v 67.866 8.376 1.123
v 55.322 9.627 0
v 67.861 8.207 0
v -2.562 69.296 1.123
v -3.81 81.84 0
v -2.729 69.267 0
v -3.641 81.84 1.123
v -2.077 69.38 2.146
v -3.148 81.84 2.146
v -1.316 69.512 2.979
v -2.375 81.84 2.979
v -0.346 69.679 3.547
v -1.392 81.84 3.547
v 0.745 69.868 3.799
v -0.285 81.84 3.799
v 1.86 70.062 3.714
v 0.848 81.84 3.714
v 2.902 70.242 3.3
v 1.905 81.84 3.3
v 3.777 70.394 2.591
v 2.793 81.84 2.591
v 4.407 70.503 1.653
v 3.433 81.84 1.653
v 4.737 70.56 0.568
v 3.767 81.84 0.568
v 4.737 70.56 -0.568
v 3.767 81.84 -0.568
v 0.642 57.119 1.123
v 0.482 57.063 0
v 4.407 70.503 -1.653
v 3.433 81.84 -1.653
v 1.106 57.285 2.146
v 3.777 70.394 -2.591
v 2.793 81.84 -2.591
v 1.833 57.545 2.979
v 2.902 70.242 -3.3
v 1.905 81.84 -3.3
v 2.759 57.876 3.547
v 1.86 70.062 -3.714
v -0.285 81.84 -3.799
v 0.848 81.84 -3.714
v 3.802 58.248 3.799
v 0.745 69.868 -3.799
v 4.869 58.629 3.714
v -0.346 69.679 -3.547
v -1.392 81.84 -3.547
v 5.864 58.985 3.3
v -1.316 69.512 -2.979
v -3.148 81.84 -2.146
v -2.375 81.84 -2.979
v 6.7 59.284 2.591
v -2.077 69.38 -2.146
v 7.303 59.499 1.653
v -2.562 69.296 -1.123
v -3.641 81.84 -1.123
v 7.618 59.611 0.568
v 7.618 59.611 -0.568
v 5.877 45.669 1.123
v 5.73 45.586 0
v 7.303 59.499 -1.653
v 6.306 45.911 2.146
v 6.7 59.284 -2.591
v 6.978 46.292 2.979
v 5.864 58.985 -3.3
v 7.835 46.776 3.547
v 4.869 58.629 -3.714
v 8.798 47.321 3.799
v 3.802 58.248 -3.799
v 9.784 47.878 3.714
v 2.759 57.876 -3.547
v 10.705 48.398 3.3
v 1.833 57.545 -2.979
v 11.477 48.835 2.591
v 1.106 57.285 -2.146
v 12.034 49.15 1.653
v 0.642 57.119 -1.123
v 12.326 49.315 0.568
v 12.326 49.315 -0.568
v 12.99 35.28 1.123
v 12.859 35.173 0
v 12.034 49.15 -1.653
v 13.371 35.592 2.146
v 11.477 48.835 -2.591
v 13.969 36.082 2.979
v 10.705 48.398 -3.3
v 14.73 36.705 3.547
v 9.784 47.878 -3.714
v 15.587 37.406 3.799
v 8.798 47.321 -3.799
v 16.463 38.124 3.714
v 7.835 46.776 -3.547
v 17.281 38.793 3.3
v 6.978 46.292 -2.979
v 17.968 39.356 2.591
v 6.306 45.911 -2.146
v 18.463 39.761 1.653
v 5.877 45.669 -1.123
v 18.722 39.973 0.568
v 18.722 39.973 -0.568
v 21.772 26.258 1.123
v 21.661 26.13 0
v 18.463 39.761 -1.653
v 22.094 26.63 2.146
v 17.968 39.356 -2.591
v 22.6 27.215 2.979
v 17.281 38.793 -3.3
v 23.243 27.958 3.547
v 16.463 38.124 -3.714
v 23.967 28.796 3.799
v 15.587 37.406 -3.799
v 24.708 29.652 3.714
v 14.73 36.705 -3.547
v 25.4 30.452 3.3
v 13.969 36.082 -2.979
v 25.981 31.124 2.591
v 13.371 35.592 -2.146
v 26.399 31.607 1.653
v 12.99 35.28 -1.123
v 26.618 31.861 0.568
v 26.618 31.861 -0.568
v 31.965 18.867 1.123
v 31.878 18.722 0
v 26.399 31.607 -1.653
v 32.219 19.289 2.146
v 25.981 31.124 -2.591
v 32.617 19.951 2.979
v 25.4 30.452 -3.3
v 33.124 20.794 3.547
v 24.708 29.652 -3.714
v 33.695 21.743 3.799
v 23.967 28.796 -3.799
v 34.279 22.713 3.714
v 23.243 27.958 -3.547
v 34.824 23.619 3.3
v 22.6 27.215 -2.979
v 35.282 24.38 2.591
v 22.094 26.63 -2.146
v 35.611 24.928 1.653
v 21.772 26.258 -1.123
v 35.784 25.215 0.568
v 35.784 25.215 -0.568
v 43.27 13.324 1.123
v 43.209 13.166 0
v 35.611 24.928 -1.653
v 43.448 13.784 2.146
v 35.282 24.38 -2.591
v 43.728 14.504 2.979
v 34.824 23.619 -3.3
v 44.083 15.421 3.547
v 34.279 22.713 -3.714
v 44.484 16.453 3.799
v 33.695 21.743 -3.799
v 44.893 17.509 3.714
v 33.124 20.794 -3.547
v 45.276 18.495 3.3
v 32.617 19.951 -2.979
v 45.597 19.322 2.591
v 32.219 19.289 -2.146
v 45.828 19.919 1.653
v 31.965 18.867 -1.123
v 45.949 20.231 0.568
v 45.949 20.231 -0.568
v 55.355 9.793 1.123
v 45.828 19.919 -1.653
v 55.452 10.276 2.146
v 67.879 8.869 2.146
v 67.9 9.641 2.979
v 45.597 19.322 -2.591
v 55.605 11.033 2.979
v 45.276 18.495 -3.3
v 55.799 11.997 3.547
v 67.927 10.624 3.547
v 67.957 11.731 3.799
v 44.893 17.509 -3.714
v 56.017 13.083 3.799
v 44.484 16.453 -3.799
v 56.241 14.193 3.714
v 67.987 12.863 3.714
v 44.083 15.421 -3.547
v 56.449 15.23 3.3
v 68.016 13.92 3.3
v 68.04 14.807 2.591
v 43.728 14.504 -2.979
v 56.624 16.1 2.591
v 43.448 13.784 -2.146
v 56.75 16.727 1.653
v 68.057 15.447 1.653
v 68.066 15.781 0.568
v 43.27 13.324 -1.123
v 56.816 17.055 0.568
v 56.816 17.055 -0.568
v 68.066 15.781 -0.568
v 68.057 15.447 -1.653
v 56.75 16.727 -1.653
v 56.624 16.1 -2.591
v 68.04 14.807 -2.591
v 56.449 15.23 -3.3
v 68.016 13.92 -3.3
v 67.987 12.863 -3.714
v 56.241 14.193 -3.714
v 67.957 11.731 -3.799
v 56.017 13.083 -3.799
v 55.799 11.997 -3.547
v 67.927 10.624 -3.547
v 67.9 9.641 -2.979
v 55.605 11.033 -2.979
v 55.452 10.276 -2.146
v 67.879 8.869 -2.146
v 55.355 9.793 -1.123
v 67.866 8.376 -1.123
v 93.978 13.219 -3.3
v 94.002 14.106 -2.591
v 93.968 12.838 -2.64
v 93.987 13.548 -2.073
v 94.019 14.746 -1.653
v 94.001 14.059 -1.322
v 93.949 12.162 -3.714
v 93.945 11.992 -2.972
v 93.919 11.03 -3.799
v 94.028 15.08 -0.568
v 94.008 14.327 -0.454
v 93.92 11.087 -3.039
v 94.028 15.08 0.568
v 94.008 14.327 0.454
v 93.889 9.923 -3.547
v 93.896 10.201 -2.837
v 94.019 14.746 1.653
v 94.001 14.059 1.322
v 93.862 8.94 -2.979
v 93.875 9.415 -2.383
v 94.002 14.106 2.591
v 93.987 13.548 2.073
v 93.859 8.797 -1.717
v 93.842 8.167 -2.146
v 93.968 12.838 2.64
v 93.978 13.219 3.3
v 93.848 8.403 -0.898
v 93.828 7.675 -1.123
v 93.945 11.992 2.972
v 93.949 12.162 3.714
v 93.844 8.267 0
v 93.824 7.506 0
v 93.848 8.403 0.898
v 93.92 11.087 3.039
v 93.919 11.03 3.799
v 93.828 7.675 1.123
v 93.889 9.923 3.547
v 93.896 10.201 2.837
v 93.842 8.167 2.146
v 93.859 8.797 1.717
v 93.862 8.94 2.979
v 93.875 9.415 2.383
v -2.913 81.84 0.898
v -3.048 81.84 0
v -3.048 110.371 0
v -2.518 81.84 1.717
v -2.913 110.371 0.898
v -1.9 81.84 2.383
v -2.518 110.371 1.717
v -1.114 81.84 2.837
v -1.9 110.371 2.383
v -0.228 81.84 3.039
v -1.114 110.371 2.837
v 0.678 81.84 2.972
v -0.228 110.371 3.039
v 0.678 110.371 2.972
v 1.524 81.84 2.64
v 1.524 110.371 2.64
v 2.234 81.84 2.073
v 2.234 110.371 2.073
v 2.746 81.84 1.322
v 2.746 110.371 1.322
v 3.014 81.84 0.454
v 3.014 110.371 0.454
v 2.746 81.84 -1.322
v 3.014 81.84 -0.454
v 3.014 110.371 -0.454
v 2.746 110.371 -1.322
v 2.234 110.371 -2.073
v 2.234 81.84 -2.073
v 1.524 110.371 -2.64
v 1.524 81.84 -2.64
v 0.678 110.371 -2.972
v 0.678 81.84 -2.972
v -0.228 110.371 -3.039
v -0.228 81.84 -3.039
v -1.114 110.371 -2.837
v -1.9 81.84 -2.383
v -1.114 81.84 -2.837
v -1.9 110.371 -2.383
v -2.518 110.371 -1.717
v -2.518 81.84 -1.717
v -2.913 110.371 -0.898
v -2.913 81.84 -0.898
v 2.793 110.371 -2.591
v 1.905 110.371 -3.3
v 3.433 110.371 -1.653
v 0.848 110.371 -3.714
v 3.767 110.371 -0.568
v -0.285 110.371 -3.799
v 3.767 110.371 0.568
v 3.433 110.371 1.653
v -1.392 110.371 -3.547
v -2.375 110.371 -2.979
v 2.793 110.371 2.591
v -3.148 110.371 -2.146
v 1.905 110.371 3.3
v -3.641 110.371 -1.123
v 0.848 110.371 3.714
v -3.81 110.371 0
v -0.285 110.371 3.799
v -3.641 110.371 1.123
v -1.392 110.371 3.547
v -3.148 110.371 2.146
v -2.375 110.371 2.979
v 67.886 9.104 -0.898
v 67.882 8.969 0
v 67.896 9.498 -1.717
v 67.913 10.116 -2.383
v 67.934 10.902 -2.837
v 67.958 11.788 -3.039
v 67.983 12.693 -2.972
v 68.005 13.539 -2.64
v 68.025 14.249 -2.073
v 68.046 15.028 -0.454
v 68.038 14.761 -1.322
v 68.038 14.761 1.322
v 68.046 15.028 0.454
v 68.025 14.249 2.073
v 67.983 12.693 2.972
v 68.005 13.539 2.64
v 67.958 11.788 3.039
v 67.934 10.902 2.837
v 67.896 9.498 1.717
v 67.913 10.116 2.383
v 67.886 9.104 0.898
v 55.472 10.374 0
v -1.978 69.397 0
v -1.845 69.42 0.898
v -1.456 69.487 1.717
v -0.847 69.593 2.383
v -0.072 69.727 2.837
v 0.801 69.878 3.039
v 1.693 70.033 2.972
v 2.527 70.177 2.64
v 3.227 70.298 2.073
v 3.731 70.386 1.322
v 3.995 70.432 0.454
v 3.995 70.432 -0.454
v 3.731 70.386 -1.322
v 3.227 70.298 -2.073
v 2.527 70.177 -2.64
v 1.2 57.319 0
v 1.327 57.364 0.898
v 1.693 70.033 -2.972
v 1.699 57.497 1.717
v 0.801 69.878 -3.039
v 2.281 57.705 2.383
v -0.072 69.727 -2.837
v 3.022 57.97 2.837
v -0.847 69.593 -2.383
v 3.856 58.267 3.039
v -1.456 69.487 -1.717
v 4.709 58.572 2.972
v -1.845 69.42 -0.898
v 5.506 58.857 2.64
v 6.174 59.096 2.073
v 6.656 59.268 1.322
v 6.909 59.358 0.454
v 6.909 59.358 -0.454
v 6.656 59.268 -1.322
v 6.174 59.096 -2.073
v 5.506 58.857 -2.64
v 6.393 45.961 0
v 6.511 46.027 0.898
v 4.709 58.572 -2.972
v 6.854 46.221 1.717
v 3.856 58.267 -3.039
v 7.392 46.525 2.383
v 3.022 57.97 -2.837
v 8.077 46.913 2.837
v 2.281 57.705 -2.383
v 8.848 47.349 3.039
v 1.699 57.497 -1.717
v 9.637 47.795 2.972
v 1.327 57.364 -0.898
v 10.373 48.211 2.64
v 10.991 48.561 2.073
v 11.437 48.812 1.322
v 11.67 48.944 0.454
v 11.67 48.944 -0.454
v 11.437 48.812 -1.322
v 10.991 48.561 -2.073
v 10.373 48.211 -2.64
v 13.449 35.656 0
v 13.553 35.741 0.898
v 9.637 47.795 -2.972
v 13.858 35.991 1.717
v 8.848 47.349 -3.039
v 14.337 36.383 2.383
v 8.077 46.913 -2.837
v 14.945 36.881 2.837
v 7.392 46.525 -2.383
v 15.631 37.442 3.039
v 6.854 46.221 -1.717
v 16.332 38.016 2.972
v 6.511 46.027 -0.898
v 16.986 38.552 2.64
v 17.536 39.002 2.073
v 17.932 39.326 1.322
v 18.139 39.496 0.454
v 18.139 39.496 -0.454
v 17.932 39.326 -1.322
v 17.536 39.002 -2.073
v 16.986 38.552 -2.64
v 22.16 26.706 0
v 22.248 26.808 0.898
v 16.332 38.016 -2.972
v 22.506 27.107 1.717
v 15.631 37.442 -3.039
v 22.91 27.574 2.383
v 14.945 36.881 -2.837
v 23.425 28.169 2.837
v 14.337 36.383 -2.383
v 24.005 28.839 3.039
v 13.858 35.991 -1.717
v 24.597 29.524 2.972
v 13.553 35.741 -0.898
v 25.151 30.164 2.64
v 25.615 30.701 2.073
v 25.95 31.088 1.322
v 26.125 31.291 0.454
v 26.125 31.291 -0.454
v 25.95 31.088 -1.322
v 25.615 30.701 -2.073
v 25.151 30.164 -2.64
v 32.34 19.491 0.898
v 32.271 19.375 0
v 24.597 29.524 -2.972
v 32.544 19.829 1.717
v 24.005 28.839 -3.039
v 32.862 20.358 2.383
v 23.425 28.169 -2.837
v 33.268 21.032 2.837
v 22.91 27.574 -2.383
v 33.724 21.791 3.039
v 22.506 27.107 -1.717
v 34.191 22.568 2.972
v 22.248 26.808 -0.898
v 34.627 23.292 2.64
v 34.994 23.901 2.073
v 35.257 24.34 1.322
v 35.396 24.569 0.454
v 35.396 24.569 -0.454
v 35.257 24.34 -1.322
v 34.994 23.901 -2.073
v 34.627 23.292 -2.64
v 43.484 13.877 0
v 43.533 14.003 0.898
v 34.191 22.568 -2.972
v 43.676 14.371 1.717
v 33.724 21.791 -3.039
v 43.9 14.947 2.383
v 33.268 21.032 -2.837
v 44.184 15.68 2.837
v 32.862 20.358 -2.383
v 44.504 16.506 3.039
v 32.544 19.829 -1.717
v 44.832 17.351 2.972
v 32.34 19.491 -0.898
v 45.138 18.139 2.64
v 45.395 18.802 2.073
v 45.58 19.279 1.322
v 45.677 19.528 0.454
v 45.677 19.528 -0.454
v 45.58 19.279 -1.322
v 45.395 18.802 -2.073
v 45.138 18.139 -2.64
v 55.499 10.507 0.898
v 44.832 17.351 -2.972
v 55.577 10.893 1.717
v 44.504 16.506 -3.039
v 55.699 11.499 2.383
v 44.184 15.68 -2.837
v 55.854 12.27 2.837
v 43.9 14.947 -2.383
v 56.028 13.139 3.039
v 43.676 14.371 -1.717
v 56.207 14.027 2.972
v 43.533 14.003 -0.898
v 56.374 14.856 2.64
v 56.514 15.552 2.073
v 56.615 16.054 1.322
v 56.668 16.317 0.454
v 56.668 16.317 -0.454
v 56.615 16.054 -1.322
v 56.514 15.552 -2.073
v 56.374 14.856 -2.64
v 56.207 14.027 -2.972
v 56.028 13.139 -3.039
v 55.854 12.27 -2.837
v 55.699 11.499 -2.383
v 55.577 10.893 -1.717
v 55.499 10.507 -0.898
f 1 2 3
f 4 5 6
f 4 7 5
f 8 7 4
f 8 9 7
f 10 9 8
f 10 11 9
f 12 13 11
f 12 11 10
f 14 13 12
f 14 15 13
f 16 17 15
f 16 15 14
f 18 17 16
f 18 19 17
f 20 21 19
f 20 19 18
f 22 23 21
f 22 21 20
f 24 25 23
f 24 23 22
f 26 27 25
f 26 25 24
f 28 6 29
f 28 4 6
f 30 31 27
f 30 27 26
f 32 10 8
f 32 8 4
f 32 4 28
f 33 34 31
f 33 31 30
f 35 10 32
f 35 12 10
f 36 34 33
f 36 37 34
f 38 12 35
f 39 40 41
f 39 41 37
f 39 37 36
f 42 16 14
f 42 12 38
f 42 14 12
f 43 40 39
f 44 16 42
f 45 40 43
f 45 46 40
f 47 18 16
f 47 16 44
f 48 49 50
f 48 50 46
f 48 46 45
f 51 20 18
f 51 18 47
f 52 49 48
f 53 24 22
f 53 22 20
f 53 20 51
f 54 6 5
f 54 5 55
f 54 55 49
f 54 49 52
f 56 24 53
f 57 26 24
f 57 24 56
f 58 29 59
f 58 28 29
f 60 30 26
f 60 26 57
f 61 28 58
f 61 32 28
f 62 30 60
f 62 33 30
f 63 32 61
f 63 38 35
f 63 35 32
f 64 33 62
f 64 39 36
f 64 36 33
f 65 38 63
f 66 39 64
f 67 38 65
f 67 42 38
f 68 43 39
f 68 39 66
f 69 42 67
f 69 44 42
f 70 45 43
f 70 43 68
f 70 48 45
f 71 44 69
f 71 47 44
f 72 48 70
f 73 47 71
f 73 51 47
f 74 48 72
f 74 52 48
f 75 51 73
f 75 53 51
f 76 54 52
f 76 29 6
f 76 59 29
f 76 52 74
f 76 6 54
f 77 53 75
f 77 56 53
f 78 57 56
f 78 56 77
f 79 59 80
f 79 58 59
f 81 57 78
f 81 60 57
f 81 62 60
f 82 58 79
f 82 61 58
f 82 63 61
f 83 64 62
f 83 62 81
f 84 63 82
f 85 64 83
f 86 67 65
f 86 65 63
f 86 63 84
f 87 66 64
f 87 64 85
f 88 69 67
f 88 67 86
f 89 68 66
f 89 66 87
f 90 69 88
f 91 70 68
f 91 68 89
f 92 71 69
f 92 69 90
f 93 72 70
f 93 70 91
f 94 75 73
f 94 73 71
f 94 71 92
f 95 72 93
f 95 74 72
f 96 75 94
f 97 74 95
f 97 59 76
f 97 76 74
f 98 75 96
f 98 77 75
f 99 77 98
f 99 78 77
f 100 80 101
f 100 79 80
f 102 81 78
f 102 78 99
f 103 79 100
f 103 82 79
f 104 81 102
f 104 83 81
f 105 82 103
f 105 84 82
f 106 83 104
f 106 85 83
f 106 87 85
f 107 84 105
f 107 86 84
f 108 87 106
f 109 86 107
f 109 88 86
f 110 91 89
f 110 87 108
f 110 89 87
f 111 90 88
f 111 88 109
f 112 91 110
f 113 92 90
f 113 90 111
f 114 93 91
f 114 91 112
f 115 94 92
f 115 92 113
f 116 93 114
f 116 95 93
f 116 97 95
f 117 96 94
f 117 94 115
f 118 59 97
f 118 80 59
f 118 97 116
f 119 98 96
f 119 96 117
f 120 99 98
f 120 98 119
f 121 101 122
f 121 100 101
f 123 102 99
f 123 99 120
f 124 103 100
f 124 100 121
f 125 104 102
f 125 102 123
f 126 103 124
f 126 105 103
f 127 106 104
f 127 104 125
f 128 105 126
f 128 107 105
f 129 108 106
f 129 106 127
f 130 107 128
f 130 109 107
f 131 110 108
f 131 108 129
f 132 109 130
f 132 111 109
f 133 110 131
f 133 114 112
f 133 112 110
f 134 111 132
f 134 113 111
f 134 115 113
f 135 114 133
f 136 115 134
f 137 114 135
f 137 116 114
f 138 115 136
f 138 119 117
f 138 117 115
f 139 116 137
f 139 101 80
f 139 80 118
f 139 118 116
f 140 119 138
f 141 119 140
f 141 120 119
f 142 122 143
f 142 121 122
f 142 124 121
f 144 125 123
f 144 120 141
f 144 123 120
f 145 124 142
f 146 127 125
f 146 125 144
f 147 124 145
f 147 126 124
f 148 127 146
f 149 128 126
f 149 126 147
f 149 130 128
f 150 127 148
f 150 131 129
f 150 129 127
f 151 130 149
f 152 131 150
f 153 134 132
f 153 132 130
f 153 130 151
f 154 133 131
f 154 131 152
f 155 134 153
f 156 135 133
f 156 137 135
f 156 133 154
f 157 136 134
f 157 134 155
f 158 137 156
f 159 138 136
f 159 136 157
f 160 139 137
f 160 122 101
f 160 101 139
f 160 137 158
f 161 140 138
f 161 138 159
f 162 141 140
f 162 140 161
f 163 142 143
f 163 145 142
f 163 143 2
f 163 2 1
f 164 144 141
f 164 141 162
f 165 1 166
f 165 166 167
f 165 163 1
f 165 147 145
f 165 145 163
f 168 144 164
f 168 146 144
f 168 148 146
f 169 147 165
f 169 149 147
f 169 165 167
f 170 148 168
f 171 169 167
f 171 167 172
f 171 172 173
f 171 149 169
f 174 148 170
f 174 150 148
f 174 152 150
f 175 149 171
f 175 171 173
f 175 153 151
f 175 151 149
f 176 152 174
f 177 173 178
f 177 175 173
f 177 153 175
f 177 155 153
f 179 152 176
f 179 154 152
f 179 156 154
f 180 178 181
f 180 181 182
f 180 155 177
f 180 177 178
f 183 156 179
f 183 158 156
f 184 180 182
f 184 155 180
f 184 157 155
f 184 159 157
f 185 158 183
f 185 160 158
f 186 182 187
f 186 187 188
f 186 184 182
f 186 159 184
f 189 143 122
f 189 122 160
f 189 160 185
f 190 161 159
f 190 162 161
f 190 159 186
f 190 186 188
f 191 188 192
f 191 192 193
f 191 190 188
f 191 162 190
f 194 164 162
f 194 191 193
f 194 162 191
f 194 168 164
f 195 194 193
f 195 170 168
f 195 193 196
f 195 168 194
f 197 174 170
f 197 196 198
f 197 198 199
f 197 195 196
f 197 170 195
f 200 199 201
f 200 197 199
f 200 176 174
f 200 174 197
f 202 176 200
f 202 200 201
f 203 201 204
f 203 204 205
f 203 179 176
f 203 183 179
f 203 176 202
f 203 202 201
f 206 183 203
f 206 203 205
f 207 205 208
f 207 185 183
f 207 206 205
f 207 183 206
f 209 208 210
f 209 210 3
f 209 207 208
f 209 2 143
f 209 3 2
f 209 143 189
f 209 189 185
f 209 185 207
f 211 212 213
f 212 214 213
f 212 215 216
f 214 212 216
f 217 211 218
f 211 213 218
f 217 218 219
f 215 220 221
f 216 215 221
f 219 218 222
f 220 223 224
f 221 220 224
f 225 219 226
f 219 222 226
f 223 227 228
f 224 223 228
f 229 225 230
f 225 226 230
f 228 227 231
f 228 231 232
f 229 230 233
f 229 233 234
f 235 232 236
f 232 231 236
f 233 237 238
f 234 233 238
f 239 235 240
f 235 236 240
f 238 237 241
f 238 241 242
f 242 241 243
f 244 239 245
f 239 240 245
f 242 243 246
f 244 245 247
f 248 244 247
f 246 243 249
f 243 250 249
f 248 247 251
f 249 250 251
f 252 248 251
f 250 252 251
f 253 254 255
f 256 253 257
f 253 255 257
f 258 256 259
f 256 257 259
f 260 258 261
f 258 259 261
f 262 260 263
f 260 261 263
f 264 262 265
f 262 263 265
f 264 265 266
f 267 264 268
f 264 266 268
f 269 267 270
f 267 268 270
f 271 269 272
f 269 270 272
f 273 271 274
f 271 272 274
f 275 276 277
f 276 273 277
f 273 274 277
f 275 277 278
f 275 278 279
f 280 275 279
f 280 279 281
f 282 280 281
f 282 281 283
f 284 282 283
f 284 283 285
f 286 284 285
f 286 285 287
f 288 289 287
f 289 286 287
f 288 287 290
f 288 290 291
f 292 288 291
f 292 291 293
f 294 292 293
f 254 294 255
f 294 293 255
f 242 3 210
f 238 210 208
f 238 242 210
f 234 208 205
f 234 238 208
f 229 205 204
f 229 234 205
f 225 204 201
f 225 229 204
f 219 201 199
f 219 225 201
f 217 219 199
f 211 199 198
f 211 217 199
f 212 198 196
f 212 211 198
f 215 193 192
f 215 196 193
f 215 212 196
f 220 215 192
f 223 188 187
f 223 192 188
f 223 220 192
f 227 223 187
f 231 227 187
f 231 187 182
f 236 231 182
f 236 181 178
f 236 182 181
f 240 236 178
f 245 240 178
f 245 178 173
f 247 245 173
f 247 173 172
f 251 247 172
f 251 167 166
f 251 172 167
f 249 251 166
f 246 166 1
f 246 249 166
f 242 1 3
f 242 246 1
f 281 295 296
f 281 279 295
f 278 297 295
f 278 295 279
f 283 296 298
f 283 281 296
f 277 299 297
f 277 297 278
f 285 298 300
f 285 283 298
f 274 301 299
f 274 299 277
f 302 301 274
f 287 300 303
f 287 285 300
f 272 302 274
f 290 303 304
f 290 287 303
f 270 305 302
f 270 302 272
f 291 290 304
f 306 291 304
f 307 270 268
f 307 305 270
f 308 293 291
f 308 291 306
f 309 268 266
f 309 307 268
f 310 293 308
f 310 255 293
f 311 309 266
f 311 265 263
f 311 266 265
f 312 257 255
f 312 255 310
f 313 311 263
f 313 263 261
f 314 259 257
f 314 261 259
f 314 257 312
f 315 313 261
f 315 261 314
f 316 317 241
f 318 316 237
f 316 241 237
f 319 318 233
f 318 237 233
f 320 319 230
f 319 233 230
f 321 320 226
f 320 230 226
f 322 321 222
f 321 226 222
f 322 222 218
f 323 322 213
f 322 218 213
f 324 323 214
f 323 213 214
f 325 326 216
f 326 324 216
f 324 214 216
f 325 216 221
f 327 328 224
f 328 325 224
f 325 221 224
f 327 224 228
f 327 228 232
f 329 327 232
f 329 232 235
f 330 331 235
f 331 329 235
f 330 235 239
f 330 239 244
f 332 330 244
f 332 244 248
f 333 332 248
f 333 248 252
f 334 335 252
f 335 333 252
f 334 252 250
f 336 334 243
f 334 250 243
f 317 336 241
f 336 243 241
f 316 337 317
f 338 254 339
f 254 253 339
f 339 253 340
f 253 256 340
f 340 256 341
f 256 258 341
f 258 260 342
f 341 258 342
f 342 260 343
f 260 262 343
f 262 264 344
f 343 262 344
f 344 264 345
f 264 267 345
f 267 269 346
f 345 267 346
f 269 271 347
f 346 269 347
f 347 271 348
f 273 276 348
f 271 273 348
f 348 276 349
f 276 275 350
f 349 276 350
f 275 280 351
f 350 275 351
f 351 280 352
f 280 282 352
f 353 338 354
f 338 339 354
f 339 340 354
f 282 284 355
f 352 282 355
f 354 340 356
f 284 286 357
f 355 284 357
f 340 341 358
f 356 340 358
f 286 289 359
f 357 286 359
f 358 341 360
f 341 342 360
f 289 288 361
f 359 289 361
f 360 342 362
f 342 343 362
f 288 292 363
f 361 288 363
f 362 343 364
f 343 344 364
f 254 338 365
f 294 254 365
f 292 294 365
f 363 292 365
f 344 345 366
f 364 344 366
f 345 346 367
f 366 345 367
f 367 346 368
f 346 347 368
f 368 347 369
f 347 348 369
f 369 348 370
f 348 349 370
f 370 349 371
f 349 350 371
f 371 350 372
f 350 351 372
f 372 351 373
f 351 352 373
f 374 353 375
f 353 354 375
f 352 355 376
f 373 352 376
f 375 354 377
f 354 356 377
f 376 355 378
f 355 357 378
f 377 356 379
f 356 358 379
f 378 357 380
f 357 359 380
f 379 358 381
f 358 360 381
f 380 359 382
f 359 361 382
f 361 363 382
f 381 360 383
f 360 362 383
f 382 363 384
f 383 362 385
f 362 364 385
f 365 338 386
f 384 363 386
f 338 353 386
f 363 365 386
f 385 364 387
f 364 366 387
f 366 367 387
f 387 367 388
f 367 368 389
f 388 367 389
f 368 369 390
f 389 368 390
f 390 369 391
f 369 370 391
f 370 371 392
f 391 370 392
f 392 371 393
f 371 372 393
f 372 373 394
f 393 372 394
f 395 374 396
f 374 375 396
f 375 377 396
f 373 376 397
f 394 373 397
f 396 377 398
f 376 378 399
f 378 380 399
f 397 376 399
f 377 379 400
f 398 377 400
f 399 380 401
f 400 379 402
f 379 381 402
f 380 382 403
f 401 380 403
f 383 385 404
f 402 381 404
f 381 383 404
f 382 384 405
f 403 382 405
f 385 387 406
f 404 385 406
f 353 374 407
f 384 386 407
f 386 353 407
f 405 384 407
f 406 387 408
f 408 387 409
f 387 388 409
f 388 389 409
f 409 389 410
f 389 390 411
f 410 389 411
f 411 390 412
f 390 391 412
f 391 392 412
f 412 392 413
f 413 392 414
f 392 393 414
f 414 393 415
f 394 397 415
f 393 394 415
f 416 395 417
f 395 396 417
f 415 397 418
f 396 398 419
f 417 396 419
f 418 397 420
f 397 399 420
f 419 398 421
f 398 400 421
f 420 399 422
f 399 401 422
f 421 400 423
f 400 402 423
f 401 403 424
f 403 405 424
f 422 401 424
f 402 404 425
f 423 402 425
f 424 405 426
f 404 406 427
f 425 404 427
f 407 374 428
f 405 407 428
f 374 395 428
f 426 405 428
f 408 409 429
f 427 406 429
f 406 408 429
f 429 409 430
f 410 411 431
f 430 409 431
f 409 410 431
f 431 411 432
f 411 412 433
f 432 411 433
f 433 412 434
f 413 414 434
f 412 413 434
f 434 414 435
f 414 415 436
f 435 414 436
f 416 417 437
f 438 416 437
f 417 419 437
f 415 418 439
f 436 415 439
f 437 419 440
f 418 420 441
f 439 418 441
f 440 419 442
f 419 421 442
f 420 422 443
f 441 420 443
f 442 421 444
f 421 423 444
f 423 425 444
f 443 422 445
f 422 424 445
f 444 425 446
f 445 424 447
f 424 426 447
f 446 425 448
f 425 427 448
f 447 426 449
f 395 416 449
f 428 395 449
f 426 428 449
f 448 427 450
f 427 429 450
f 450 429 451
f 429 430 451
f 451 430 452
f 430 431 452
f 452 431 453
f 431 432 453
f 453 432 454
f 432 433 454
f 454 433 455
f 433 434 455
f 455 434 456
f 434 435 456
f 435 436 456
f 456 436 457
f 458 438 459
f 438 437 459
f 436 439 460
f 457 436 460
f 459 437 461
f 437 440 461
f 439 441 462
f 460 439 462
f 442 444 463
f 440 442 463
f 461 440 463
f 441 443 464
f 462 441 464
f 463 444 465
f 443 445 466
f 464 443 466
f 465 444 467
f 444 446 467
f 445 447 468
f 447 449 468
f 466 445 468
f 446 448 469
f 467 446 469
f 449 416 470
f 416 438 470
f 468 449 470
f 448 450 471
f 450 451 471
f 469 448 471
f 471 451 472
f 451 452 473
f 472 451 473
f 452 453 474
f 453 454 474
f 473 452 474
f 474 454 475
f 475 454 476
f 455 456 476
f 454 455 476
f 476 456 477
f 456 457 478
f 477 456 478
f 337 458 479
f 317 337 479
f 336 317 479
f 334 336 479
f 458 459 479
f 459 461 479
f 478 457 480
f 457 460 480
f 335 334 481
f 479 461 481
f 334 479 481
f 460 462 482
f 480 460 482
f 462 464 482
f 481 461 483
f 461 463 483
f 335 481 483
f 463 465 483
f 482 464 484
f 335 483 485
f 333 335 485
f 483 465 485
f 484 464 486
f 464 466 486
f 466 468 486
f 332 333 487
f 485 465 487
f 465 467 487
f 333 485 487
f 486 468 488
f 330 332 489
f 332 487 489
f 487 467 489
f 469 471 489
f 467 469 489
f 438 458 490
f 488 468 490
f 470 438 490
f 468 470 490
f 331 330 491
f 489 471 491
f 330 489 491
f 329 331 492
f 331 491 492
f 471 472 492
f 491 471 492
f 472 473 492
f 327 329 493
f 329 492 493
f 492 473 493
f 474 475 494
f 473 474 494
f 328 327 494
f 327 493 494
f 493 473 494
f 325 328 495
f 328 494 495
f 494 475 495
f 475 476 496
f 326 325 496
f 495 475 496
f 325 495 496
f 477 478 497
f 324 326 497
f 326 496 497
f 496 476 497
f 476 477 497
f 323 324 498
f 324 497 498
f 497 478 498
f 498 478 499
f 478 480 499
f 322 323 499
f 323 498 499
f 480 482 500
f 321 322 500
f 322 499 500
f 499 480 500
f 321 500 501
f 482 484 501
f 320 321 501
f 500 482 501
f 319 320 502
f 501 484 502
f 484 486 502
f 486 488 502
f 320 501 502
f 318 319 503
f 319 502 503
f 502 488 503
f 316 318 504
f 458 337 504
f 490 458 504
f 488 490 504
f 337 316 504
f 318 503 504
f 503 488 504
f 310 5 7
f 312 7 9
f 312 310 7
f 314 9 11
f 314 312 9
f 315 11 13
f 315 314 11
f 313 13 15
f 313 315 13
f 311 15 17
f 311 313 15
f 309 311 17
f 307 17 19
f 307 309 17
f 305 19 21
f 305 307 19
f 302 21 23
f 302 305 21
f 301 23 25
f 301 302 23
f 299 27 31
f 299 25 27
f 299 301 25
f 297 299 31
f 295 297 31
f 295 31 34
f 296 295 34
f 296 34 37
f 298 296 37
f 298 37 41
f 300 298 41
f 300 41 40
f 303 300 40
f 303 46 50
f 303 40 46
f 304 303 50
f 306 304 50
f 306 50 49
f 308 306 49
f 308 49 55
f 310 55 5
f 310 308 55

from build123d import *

# Parameters (mm, degrees)
SKETCH4_R           = 3.81
SKETCH4_R_2         = 3.048
BOSS_EXTRUDE1_DEPTH = 2.54
SKETCH4_3_R         = 3.81
SKETCH4_3_R_2       = 3.048


with BuildPart() as part:
    # Sketch4 → Boss-Extrude1 (new body)
    with BuildSketch(Plane(origin=(0, 110.370938621, 0), x_dir=(-1, 0, 0), z_dir=(0, 1, 0))):
        Circle(SKETCH4_R)
        Circle(SKETCH4_R_2, mode=Mode.SUBTRACT)
    extrude(amount=-BOSS_EXTRUDE1_DEPTH)

    # Sweep2: sweep along a path in Sketch3
    with BuildLine(Plane.XY) as sweep2_path:
        Line((0, 110.370938621), (0, 81.839949684))
        ThreePointArc((0, 81.839949684), (19.796310895, 33.11982338), (67.964229263, 12.015409809))
        Line((67.964229263, 12.015409809), (93.926499612, 11.314239564))
    # Sketch4<3> → Sweep2 (sweep)
    with BuildSketch(Plane(origin=(0, 110.370938621, 0), x_dir=(-1, 0, 0), z_dir=(0, 1, 0))):
        Circle(SKETCH4_3_R)
        Circle(SKETCH4_3_R_2, mode=Mode.SUBTRACT)
    sweep(path=sweep2_path.line)


solid = part.part
